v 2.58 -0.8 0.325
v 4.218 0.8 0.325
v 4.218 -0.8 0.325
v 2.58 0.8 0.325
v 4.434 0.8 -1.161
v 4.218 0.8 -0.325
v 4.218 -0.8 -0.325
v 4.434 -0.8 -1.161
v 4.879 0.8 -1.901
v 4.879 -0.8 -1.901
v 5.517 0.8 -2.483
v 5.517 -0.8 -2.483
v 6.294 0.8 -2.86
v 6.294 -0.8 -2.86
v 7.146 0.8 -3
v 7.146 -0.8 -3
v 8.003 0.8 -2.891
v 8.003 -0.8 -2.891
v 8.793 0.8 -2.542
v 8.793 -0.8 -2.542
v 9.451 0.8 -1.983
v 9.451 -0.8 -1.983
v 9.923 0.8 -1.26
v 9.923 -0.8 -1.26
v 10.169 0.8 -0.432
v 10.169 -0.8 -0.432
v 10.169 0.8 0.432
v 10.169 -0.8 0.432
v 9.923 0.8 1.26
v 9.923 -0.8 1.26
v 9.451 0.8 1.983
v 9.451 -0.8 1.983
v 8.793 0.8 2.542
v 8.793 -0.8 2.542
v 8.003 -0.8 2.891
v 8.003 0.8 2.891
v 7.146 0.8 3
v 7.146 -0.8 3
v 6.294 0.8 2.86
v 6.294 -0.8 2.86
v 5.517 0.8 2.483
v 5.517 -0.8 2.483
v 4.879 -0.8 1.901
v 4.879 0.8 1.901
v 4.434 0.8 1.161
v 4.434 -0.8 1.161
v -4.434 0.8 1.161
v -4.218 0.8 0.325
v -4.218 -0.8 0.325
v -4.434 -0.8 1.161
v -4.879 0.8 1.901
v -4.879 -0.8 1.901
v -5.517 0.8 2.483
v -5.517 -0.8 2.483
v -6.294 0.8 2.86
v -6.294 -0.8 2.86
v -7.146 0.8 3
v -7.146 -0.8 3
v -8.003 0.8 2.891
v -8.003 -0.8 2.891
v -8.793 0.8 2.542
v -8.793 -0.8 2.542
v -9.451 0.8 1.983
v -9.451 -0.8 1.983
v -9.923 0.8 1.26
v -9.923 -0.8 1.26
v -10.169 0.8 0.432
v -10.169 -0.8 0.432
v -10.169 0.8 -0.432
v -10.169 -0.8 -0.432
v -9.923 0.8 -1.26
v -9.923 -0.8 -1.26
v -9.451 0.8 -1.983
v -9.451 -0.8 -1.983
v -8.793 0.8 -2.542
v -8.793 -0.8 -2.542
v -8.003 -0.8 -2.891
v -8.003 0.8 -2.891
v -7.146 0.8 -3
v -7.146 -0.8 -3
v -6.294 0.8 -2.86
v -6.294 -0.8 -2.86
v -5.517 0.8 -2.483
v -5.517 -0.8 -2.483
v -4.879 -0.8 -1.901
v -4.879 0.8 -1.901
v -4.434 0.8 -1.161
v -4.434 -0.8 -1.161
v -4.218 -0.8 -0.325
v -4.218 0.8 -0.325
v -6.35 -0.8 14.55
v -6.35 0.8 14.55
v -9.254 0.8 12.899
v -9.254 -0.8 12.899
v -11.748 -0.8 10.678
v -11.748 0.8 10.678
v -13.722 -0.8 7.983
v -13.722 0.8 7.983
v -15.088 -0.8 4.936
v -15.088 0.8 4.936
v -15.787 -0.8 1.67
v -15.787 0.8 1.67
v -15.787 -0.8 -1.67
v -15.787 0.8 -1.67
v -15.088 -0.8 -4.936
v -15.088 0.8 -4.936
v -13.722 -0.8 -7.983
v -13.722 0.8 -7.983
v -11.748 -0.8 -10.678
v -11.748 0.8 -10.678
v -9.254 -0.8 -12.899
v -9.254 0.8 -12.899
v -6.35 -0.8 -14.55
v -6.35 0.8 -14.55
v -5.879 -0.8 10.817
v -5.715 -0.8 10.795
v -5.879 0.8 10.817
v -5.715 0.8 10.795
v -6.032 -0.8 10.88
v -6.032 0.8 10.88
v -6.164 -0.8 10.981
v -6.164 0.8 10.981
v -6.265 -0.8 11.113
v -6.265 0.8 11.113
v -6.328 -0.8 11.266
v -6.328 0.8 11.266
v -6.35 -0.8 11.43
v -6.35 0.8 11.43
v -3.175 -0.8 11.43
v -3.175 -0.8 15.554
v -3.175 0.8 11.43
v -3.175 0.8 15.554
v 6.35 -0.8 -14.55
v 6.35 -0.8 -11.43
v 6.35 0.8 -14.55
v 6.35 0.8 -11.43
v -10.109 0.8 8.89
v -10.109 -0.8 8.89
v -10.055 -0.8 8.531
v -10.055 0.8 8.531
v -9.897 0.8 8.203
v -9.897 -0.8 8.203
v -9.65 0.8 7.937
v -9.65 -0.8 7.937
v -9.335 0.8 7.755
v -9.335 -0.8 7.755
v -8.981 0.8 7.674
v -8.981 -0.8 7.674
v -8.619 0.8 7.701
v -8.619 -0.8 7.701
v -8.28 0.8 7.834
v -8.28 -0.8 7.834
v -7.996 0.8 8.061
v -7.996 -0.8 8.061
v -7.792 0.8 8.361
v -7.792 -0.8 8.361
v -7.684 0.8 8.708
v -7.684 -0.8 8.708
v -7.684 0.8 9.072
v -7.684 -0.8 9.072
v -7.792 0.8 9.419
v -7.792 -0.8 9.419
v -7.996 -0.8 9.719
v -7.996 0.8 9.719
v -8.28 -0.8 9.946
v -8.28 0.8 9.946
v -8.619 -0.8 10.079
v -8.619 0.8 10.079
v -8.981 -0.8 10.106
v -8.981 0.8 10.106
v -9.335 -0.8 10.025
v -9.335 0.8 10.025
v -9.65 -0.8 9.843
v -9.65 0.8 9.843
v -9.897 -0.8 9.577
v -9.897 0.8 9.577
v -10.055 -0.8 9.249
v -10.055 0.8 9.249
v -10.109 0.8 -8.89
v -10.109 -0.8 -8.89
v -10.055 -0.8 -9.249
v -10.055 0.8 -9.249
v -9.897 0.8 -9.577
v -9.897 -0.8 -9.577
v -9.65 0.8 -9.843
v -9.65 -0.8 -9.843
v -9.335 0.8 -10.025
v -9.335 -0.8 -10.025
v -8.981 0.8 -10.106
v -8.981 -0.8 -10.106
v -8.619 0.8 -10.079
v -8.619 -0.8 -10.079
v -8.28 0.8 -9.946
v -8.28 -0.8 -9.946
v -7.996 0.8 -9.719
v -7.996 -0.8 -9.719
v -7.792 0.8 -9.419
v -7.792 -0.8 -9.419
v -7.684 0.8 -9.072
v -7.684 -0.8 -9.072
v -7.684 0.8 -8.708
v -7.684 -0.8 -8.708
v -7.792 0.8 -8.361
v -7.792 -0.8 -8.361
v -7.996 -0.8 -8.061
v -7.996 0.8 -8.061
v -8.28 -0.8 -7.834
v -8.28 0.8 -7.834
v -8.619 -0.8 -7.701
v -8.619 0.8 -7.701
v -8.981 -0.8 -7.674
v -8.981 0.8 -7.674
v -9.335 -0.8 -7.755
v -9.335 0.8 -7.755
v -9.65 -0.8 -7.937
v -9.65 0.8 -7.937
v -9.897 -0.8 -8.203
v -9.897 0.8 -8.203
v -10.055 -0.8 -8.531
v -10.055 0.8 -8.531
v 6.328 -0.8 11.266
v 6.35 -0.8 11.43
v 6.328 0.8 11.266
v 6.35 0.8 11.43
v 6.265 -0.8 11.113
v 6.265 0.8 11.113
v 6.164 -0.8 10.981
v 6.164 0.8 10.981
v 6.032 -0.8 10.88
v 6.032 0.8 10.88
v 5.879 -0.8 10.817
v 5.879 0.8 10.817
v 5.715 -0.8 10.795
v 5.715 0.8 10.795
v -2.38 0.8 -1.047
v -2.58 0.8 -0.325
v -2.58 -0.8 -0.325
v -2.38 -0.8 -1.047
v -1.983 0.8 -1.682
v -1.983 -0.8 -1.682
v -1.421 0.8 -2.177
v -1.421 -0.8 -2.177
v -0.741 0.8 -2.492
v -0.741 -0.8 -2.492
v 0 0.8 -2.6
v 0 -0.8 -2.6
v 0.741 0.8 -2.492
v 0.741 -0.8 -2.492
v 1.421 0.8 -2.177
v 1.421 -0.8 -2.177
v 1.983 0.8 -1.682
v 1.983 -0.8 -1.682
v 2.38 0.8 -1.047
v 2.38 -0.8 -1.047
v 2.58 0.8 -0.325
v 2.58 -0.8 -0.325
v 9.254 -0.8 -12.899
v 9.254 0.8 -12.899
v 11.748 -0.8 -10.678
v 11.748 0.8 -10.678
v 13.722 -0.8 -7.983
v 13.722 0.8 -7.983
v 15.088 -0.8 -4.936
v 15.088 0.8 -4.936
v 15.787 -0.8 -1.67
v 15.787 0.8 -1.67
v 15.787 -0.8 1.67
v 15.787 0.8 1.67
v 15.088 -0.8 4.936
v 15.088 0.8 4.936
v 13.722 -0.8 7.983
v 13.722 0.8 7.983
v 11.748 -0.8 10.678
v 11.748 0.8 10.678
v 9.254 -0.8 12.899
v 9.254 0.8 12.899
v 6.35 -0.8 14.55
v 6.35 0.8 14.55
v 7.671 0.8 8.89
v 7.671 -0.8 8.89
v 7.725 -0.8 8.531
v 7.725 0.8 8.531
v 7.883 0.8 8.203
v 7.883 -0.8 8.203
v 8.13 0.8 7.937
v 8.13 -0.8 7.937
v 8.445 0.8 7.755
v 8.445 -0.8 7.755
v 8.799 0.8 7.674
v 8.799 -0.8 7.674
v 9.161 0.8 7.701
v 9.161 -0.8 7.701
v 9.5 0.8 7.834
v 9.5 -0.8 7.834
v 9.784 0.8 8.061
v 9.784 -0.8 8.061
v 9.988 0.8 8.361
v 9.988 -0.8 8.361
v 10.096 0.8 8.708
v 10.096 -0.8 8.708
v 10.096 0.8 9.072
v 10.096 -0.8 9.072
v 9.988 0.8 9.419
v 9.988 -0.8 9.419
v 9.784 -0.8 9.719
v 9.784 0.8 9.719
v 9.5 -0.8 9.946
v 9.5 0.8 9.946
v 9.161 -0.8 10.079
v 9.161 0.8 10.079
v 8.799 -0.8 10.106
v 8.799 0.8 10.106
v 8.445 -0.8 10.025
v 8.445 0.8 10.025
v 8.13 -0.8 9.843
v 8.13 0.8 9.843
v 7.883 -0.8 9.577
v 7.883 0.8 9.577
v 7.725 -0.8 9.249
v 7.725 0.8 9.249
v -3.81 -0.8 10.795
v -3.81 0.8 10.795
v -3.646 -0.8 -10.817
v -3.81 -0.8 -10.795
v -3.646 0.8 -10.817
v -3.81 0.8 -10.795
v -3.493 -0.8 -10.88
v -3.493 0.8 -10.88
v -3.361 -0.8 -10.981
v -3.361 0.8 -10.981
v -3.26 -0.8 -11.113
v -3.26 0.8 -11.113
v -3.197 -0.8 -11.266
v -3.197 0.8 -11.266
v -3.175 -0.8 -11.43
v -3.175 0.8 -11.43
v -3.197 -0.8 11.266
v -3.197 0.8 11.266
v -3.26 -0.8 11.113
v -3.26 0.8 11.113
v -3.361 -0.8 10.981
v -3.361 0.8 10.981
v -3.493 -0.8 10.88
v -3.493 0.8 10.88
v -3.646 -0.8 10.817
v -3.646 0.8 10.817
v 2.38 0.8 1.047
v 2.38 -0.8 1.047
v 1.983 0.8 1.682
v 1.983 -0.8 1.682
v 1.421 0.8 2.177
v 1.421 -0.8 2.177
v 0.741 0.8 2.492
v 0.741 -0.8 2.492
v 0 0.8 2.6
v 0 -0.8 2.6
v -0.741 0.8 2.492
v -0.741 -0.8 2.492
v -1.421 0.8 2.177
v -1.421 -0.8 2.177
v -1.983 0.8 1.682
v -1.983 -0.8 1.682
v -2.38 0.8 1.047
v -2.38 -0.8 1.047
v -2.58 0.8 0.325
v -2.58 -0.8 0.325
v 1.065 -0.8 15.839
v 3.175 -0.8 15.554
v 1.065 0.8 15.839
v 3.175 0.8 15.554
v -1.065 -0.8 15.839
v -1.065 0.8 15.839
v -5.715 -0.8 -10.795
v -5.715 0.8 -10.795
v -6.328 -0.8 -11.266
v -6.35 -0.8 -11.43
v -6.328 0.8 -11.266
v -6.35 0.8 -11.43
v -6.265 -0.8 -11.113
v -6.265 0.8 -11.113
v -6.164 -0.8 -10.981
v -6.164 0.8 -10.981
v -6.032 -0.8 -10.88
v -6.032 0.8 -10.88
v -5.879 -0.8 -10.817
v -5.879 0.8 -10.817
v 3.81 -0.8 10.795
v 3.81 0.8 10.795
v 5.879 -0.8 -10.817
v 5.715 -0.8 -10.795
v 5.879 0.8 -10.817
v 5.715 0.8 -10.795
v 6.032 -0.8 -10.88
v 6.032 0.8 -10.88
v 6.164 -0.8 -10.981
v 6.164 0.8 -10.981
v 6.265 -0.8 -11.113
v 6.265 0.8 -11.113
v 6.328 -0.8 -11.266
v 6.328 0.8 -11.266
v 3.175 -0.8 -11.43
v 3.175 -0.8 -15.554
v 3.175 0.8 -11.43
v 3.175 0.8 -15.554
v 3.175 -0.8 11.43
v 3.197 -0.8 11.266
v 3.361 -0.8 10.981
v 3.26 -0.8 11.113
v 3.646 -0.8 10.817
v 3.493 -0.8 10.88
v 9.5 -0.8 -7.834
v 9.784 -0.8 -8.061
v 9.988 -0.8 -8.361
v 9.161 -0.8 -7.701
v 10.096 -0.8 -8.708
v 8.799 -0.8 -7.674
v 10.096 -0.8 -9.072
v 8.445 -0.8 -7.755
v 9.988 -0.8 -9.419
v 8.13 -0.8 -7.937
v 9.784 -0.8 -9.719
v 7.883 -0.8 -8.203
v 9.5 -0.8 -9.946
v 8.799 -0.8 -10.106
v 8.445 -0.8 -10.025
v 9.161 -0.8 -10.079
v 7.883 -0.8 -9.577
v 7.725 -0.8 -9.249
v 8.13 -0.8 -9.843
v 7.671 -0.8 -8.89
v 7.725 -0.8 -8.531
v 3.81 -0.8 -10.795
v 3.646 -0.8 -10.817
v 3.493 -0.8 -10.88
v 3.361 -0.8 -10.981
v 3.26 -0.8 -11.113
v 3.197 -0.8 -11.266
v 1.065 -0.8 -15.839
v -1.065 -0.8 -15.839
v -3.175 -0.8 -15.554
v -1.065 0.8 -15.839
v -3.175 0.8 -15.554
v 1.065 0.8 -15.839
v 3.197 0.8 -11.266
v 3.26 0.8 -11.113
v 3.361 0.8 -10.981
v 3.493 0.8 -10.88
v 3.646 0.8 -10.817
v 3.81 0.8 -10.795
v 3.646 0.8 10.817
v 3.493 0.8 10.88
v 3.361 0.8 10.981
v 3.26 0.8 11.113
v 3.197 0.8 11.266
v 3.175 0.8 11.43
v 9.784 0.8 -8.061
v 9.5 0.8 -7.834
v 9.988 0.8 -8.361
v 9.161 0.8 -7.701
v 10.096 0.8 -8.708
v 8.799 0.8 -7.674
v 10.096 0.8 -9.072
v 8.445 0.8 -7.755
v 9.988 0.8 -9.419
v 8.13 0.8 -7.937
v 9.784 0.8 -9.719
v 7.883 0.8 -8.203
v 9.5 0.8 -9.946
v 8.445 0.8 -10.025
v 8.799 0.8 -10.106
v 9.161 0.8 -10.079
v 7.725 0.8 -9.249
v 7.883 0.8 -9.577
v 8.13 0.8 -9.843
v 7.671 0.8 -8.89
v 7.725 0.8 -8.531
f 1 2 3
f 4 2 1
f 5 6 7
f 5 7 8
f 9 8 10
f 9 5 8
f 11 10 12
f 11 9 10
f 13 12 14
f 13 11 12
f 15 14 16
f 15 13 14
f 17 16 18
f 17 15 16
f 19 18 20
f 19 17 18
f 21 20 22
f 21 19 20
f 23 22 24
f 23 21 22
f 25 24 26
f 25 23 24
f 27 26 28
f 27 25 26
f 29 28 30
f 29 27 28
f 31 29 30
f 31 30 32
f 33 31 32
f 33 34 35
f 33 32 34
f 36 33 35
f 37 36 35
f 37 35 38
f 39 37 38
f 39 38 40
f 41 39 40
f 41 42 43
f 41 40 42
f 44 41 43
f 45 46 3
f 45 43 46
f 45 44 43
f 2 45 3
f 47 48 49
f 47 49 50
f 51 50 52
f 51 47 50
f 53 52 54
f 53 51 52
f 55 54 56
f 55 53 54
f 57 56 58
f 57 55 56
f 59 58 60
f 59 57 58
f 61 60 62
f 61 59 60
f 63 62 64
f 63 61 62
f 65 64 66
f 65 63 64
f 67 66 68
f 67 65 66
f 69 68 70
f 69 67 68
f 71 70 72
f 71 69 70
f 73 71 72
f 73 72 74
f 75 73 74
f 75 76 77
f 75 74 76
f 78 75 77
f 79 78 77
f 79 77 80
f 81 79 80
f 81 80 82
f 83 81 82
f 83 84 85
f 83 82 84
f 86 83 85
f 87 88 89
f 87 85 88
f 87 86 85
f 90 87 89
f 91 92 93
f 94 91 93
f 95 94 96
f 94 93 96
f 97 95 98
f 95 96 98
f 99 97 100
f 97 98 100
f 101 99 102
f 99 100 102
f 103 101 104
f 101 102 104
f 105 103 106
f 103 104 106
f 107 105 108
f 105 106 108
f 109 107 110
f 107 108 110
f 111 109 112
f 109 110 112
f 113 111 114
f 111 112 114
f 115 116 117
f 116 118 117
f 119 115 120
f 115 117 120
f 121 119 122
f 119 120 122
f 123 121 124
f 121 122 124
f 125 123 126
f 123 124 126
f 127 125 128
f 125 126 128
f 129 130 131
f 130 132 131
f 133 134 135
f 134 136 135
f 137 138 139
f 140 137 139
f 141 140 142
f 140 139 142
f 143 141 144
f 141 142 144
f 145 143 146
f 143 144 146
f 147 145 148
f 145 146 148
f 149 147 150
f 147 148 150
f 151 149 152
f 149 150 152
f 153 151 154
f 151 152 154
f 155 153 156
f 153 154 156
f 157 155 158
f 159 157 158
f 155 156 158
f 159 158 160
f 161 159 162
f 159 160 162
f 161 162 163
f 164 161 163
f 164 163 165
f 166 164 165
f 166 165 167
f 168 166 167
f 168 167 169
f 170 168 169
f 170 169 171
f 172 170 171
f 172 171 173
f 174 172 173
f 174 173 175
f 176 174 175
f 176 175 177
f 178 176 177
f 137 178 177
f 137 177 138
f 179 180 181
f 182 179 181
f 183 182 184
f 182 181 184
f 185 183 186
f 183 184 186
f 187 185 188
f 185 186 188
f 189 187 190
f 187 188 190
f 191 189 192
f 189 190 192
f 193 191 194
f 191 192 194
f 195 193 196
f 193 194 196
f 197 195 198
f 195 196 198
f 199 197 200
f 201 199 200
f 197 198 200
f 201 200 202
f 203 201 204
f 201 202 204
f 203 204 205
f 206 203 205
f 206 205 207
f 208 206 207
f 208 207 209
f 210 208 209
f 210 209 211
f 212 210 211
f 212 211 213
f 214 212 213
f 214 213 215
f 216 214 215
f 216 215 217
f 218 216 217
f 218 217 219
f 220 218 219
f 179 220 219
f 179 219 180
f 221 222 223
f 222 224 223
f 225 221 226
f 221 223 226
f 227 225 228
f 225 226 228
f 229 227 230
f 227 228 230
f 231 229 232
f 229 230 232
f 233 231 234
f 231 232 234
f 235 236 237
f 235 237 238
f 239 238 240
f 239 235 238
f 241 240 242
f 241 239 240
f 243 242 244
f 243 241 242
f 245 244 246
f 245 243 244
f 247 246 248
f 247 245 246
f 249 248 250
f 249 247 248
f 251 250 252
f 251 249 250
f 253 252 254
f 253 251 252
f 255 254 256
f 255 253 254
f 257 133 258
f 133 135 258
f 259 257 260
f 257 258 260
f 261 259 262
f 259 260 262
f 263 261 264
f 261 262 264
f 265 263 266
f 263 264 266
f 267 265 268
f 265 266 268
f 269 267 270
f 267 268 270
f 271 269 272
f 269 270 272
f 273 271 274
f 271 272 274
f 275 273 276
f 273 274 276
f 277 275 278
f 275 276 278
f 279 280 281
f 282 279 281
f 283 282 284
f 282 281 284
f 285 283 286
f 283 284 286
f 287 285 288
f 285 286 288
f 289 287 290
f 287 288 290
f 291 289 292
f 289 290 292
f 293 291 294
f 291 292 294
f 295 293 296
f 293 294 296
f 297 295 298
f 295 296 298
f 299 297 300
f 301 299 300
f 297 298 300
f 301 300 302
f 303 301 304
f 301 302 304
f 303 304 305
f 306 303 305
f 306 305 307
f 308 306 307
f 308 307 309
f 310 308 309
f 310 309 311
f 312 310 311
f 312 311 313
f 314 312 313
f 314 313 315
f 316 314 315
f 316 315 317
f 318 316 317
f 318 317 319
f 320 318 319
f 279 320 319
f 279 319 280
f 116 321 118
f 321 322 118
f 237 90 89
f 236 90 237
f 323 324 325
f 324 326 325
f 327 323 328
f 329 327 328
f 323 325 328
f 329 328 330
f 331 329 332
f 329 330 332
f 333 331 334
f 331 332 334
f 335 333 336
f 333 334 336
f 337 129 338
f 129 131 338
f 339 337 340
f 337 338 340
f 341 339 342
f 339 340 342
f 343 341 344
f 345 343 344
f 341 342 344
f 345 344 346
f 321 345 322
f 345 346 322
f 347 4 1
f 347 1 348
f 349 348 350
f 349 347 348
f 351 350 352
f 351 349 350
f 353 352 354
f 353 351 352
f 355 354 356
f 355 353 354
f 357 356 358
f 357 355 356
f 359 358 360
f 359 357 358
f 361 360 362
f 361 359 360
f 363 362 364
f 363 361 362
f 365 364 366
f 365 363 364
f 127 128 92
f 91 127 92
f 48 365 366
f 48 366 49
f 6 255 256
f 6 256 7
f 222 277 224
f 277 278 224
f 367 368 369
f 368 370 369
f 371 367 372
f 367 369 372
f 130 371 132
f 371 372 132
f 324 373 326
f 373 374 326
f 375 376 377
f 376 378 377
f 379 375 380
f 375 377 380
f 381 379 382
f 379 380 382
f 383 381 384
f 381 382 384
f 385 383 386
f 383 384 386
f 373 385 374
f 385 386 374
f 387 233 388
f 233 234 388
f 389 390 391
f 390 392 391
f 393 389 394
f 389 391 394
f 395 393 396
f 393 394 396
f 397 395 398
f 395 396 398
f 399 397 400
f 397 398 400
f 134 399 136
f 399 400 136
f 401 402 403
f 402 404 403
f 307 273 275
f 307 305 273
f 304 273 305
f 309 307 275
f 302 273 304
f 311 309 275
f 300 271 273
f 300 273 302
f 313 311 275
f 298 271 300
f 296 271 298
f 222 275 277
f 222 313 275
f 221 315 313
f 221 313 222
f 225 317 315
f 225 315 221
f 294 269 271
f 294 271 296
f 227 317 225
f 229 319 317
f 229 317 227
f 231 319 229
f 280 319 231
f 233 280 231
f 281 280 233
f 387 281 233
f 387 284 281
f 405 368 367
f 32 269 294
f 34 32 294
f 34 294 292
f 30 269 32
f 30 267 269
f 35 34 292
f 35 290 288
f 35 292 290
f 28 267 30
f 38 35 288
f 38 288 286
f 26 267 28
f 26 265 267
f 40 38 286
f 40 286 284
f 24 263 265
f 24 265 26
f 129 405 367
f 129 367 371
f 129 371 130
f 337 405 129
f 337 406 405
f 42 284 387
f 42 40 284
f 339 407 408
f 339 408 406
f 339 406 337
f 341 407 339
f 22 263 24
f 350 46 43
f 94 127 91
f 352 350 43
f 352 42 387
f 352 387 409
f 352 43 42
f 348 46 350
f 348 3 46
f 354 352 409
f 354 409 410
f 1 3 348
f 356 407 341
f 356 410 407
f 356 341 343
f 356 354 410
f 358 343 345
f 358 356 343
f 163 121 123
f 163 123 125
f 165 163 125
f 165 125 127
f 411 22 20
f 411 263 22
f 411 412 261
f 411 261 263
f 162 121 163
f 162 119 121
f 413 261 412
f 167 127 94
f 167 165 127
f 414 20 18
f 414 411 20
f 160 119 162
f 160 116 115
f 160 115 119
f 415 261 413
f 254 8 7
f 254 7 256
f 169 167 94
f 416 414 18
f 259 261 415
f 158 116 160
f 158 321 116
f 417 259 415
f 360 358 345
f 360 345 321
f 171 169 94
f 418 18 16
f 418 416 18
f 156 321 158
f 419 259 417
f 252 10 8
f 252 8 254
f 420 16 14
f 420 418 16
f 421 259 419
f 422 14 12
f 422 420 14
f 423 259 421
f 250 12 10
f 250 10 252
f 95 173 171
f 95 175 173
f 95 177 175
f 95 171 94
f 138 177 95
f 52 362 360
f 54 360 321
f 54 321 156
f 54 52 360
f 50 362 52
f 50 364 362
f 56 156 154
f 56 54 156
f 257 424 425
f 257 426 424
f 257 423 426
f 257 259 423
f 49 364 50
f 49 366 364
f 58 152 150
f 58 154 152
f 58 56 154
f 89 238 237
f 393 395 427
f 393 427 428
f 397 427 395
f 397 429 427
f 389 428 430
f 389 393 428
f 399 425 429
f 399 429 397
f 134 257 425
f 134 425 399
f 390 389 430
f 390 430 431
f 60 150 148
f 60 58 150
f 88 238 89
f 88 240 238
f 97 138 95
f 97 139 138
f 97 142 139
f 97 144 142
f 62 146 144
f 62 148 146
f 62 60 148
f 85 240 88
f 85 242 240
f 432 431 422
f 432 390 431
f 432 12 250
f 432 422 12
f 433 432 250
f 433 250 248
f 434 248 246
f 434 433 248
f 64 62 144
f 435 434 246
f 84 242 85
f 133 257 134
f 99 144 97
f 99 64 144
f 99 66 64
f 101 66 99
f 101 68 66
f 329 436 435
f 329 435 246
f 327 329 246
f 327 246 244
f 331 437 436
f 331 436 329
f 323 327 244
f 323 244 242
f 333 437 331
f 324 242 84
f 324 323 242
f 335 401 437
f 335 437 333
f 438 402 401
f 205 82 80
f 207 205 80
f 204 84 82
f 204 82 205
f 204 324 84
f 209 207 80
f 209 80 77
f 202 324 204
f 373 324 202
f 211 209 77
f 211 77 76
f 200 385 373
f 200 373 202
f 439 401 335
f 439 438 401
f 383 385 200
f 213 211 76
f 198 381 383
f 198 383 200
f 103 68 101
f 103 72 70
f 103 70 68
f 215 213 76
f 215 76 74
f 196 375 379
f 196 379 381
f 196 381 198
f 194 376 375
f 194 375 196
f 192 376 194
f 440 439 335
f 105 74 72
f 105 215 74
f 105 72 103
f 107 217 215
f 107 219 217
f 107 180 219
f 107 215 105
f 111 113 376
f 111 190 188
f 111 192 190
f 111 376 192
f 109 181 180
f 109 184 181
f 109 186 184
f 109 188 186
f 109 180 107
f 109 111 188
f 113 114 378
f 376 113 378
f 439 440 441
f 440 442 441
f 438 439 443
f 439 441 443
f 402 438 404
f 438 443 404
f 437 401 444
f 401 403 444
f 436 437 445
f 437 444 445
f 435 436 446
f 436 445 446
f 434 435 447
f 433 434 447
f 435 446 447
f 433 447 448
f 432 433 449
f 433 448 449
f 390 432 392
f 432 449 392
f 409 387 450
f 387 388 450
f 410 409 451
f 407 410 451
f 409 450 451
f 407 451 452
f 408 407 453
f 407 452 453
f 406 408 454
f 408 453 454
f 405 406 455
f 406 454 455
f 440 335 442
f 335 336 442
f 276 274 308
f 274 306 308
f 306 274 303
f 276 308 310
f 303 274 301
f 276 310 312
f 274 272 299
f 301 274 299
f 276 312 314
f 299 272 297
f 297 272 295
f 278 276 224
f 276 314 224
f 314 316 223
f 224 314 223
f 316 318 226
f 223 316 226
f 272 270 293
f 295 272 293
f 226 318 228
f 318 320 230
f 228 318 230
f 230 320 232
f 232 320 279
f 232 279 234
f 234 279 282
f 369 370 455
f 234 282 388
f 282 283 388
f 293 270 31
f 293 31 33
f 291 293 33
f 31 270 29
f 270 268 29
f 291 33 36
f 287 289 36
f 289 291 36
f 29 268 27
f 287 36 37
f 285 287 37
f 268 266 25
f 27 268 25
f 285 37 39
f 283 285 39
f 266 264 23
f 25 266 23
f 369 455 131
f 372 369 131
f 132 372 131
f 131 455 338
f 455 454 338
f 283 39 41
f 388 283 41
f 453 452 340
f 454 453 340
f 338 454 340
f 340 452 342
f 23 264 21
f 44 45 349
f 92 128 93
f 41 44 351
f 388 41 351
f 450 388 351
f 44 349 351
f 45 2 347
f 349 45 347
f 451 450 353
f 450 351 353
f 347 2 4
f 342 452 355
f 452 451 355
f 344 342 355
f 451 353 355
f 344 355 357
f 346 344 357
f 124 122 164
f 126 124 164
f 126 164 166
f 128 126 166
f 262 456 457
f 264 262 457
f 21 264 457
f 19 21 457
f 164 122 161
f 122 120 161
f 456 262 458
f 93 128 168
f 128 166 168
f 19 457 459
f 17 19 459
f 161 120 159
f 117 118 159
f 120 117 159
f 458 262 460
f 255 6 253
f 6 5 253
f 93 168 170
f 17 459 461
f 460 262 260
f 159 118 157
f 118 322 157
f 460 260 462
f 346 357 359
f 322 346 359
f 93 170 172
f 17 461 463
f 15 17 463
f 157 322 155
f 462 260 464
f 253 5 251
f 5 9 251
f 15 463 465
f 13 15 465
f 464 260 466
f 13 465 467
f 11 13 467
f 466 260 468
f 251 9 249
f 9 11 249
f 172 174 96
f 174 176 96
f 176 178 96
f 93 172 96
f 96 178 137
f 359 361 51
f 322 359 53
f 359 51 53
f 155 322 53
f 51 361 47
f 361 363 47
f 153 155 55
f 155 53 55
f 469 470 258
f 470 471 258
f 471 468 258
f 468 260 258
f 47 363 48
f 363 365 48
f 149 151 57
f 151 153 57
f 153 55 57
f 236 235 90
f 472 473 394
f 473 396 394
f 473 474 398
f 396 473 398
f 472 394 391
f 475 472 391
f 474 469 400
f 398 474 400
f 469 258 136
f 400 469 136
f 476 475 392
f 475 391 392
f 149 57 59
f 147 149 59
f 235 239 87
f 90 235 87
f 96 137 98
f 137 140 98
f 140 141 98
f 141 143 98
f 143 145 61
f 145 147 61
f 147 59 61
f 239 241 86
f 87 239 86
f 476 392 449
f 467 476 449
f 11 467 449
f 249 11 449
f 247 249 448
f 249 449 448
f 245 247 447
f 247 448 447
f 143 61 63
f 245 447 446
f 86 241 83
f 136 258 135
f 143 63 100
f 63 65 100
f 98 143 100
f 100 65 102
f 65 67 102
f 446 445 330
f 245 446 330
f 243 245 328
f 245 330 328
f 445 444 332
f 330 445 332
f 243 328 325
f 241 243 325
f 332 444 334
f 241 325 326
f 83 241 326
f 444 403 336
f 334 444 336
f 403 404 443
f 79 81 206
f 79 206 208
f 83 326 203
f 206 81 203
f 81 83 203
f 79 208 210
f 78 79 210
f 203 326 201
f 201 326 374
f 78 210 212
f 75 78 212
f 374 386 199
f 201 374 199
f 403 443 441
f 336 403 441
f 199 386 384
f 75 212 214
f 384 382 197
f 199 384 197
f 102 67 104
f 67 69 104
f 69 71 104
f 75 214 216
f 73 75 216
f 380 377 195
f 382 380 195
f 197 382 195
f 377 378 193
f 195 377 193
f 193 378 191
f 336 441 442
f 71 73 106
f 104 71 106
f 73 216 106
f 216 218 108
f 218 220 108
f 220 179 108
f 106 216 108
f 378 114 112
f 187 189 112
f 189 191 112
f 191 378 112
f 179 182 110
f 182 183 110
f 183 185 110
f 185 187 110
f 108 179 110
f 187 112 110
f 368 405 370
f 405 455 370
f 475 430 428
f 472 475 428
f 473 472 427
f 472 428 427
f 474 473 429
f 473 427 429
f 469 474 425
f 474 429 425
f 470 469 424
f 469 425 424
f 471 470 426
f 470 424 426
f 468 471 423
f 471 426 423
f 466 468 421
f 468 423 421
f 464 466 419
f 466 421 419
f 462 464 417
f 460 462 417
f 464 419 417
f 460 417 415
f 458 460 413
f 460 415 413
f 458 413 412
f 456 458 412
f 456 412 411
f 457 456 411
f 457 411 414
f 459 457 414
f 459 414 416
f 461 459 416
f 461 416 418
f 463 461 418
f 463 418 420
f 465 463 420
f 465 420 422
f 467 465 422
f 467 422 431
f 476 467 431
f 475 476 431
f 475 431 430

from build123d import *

# Parameters (mm, degrees)
BOSS_EXTRUDE1_DEPTH       = 0.8
CUT_EXTRUDE1_DEPTH        = 2.6
F_2_CLEARANCE_HOLE1_D     = 2.4384
F_2_CLEARANCE_HOLE1_DEPTH = 1.6


with BuildPart() as part:
    # Sketch1 → Boss-Extrude1 (new body, symmetric)
    with BuildSketch(Plane(origin=(0, 0, 0), x_dir=(1, 0, 0), z_dir=(0, 1, 0))):
        with BuildLine():
            Line((-6.35, 14.549677831), (-6.35, 11.43))
            ThreePointArc((-6.35, 11.43), (-6.164012806, 10.980987194), (-5.715, 10.795))
            Line((-5.715, 10.795), (-3.81, 10.795))
            ThreePointArc((-3.81, 10.795), (-3.360987194, 10.980987194), (-3.175, 11.43))
            Line((-3.175, 11.43), (-3.175, 15.554259867))
            ThreePointArc((-3.175, 15.554259867), (0, 15.875), (3.175, 15.554259867))
            Line((3.175, 15.554259867), (3.175, 11.43))
            ThreePointArc((3.175, 11.43), (3.360987194, 10.980987194), (3.81, 10.795))
            Line((3.81, 10.795), (5.715, 10.795))
            ThreePointArc((5.715, 10.795), (6.164012806, 10.980987194), (6.35, 11.43))
            Line((6.35, 11.43), (6.35, 14.549677831))
            ThreePointArc((6.35, 14.549677831), (15.875, 0), (6.35, -14.549677831))
            Line((6.35, -14.549677831), (6.35, -11.43))
            ThreePointArc((6.35, -11.43), (6.164012806, -10.980987194), (5.715, -10.795))
            Line((5.715, -10.795), (3.81, -10.795))
            ThreePointArc((3.81, -10.795), (3.360987194, -10.980987194), (3.175, -11.43))
            Line((3.175, -11.43), (3.175, -15.554259867))
            ThreePointArc((3.175, -15.554259867), (0, -15.875), (-3.175, -15.554259867))
            Line((-3.175, -15.554259867), (-3.175, -11.43))
            ThreePointArc((-3.175, -11.43), (-3.360987194, -10.980987194), (-3.81, -10.795))
            Line((-3.81, -10.795), (-5.715, -10.795))
            ThreePointArc((-5.715, -10.795), (-6.164012806, -10.980987194), (-6.35, -11.43))
            Line((-6.35, -11.43), (-6.35, -14.549677831))
            ThreePointArc((-6.35, -14.549677831), (-15.875, 0), (-6.35, 14.549677831))
        make_face()
    extrude(amount=BOSS_EXTRUDE1_DEPTH, both=True)

    # Sketch2 → Cut-Extrude1 (cut, through all)
    with BuildSketch(Plane(origin=(0, 0.8, 0), x_dir=(1, 0, 0), z_dir=(0, 1, 0))):
        with BuildLine():
            Line((-4.217656123, 0.325), (-2.579607528, 0.325))
            ThreePointArc((-2.579607528, 0.325), (0, 2.6), (2.579607528, 0.325))
            Line((2.579607528, 0.325), (4.217656123, 0.325))
            ThreePointArc((4.217656123, 0.325), (10.2, 0), (4.217656123, -0.325))
            Line((4.217656123, -0.325), (2.579607528, -0.325))
            ThreePointArc((2.579607528, -0.325), (0, -2.6), (-2.579607528, -0.325))
            Line((-2.579607528, -0.325), (-4.217656123, -0.325))
            ThreePointArc((-4.217656123, -0.325), (-10.2, 0), (-4.217656123, 0.325))
        make_face()
    extrude(amount=-CUT_EXTRUDE1_DEPTH, mode=Mode.SUBTRACT)

    # #2 Clearance Hole1
    with Locations(Plane(origin=(0, 0.8, 0), x_dir=(1, 0, 0), z_dir=(0, 1, 0))):
        with Locations((-8.89, 8.89), (8.89, 8.89), (-8.89, -8.89), (8.89, -8.89)):
            Hole(F_2_CLEARANCE_HOLE1_D / 2, depth=F_2_CLEARANCE_HOLE1_DEPTH)


solid = part.part
